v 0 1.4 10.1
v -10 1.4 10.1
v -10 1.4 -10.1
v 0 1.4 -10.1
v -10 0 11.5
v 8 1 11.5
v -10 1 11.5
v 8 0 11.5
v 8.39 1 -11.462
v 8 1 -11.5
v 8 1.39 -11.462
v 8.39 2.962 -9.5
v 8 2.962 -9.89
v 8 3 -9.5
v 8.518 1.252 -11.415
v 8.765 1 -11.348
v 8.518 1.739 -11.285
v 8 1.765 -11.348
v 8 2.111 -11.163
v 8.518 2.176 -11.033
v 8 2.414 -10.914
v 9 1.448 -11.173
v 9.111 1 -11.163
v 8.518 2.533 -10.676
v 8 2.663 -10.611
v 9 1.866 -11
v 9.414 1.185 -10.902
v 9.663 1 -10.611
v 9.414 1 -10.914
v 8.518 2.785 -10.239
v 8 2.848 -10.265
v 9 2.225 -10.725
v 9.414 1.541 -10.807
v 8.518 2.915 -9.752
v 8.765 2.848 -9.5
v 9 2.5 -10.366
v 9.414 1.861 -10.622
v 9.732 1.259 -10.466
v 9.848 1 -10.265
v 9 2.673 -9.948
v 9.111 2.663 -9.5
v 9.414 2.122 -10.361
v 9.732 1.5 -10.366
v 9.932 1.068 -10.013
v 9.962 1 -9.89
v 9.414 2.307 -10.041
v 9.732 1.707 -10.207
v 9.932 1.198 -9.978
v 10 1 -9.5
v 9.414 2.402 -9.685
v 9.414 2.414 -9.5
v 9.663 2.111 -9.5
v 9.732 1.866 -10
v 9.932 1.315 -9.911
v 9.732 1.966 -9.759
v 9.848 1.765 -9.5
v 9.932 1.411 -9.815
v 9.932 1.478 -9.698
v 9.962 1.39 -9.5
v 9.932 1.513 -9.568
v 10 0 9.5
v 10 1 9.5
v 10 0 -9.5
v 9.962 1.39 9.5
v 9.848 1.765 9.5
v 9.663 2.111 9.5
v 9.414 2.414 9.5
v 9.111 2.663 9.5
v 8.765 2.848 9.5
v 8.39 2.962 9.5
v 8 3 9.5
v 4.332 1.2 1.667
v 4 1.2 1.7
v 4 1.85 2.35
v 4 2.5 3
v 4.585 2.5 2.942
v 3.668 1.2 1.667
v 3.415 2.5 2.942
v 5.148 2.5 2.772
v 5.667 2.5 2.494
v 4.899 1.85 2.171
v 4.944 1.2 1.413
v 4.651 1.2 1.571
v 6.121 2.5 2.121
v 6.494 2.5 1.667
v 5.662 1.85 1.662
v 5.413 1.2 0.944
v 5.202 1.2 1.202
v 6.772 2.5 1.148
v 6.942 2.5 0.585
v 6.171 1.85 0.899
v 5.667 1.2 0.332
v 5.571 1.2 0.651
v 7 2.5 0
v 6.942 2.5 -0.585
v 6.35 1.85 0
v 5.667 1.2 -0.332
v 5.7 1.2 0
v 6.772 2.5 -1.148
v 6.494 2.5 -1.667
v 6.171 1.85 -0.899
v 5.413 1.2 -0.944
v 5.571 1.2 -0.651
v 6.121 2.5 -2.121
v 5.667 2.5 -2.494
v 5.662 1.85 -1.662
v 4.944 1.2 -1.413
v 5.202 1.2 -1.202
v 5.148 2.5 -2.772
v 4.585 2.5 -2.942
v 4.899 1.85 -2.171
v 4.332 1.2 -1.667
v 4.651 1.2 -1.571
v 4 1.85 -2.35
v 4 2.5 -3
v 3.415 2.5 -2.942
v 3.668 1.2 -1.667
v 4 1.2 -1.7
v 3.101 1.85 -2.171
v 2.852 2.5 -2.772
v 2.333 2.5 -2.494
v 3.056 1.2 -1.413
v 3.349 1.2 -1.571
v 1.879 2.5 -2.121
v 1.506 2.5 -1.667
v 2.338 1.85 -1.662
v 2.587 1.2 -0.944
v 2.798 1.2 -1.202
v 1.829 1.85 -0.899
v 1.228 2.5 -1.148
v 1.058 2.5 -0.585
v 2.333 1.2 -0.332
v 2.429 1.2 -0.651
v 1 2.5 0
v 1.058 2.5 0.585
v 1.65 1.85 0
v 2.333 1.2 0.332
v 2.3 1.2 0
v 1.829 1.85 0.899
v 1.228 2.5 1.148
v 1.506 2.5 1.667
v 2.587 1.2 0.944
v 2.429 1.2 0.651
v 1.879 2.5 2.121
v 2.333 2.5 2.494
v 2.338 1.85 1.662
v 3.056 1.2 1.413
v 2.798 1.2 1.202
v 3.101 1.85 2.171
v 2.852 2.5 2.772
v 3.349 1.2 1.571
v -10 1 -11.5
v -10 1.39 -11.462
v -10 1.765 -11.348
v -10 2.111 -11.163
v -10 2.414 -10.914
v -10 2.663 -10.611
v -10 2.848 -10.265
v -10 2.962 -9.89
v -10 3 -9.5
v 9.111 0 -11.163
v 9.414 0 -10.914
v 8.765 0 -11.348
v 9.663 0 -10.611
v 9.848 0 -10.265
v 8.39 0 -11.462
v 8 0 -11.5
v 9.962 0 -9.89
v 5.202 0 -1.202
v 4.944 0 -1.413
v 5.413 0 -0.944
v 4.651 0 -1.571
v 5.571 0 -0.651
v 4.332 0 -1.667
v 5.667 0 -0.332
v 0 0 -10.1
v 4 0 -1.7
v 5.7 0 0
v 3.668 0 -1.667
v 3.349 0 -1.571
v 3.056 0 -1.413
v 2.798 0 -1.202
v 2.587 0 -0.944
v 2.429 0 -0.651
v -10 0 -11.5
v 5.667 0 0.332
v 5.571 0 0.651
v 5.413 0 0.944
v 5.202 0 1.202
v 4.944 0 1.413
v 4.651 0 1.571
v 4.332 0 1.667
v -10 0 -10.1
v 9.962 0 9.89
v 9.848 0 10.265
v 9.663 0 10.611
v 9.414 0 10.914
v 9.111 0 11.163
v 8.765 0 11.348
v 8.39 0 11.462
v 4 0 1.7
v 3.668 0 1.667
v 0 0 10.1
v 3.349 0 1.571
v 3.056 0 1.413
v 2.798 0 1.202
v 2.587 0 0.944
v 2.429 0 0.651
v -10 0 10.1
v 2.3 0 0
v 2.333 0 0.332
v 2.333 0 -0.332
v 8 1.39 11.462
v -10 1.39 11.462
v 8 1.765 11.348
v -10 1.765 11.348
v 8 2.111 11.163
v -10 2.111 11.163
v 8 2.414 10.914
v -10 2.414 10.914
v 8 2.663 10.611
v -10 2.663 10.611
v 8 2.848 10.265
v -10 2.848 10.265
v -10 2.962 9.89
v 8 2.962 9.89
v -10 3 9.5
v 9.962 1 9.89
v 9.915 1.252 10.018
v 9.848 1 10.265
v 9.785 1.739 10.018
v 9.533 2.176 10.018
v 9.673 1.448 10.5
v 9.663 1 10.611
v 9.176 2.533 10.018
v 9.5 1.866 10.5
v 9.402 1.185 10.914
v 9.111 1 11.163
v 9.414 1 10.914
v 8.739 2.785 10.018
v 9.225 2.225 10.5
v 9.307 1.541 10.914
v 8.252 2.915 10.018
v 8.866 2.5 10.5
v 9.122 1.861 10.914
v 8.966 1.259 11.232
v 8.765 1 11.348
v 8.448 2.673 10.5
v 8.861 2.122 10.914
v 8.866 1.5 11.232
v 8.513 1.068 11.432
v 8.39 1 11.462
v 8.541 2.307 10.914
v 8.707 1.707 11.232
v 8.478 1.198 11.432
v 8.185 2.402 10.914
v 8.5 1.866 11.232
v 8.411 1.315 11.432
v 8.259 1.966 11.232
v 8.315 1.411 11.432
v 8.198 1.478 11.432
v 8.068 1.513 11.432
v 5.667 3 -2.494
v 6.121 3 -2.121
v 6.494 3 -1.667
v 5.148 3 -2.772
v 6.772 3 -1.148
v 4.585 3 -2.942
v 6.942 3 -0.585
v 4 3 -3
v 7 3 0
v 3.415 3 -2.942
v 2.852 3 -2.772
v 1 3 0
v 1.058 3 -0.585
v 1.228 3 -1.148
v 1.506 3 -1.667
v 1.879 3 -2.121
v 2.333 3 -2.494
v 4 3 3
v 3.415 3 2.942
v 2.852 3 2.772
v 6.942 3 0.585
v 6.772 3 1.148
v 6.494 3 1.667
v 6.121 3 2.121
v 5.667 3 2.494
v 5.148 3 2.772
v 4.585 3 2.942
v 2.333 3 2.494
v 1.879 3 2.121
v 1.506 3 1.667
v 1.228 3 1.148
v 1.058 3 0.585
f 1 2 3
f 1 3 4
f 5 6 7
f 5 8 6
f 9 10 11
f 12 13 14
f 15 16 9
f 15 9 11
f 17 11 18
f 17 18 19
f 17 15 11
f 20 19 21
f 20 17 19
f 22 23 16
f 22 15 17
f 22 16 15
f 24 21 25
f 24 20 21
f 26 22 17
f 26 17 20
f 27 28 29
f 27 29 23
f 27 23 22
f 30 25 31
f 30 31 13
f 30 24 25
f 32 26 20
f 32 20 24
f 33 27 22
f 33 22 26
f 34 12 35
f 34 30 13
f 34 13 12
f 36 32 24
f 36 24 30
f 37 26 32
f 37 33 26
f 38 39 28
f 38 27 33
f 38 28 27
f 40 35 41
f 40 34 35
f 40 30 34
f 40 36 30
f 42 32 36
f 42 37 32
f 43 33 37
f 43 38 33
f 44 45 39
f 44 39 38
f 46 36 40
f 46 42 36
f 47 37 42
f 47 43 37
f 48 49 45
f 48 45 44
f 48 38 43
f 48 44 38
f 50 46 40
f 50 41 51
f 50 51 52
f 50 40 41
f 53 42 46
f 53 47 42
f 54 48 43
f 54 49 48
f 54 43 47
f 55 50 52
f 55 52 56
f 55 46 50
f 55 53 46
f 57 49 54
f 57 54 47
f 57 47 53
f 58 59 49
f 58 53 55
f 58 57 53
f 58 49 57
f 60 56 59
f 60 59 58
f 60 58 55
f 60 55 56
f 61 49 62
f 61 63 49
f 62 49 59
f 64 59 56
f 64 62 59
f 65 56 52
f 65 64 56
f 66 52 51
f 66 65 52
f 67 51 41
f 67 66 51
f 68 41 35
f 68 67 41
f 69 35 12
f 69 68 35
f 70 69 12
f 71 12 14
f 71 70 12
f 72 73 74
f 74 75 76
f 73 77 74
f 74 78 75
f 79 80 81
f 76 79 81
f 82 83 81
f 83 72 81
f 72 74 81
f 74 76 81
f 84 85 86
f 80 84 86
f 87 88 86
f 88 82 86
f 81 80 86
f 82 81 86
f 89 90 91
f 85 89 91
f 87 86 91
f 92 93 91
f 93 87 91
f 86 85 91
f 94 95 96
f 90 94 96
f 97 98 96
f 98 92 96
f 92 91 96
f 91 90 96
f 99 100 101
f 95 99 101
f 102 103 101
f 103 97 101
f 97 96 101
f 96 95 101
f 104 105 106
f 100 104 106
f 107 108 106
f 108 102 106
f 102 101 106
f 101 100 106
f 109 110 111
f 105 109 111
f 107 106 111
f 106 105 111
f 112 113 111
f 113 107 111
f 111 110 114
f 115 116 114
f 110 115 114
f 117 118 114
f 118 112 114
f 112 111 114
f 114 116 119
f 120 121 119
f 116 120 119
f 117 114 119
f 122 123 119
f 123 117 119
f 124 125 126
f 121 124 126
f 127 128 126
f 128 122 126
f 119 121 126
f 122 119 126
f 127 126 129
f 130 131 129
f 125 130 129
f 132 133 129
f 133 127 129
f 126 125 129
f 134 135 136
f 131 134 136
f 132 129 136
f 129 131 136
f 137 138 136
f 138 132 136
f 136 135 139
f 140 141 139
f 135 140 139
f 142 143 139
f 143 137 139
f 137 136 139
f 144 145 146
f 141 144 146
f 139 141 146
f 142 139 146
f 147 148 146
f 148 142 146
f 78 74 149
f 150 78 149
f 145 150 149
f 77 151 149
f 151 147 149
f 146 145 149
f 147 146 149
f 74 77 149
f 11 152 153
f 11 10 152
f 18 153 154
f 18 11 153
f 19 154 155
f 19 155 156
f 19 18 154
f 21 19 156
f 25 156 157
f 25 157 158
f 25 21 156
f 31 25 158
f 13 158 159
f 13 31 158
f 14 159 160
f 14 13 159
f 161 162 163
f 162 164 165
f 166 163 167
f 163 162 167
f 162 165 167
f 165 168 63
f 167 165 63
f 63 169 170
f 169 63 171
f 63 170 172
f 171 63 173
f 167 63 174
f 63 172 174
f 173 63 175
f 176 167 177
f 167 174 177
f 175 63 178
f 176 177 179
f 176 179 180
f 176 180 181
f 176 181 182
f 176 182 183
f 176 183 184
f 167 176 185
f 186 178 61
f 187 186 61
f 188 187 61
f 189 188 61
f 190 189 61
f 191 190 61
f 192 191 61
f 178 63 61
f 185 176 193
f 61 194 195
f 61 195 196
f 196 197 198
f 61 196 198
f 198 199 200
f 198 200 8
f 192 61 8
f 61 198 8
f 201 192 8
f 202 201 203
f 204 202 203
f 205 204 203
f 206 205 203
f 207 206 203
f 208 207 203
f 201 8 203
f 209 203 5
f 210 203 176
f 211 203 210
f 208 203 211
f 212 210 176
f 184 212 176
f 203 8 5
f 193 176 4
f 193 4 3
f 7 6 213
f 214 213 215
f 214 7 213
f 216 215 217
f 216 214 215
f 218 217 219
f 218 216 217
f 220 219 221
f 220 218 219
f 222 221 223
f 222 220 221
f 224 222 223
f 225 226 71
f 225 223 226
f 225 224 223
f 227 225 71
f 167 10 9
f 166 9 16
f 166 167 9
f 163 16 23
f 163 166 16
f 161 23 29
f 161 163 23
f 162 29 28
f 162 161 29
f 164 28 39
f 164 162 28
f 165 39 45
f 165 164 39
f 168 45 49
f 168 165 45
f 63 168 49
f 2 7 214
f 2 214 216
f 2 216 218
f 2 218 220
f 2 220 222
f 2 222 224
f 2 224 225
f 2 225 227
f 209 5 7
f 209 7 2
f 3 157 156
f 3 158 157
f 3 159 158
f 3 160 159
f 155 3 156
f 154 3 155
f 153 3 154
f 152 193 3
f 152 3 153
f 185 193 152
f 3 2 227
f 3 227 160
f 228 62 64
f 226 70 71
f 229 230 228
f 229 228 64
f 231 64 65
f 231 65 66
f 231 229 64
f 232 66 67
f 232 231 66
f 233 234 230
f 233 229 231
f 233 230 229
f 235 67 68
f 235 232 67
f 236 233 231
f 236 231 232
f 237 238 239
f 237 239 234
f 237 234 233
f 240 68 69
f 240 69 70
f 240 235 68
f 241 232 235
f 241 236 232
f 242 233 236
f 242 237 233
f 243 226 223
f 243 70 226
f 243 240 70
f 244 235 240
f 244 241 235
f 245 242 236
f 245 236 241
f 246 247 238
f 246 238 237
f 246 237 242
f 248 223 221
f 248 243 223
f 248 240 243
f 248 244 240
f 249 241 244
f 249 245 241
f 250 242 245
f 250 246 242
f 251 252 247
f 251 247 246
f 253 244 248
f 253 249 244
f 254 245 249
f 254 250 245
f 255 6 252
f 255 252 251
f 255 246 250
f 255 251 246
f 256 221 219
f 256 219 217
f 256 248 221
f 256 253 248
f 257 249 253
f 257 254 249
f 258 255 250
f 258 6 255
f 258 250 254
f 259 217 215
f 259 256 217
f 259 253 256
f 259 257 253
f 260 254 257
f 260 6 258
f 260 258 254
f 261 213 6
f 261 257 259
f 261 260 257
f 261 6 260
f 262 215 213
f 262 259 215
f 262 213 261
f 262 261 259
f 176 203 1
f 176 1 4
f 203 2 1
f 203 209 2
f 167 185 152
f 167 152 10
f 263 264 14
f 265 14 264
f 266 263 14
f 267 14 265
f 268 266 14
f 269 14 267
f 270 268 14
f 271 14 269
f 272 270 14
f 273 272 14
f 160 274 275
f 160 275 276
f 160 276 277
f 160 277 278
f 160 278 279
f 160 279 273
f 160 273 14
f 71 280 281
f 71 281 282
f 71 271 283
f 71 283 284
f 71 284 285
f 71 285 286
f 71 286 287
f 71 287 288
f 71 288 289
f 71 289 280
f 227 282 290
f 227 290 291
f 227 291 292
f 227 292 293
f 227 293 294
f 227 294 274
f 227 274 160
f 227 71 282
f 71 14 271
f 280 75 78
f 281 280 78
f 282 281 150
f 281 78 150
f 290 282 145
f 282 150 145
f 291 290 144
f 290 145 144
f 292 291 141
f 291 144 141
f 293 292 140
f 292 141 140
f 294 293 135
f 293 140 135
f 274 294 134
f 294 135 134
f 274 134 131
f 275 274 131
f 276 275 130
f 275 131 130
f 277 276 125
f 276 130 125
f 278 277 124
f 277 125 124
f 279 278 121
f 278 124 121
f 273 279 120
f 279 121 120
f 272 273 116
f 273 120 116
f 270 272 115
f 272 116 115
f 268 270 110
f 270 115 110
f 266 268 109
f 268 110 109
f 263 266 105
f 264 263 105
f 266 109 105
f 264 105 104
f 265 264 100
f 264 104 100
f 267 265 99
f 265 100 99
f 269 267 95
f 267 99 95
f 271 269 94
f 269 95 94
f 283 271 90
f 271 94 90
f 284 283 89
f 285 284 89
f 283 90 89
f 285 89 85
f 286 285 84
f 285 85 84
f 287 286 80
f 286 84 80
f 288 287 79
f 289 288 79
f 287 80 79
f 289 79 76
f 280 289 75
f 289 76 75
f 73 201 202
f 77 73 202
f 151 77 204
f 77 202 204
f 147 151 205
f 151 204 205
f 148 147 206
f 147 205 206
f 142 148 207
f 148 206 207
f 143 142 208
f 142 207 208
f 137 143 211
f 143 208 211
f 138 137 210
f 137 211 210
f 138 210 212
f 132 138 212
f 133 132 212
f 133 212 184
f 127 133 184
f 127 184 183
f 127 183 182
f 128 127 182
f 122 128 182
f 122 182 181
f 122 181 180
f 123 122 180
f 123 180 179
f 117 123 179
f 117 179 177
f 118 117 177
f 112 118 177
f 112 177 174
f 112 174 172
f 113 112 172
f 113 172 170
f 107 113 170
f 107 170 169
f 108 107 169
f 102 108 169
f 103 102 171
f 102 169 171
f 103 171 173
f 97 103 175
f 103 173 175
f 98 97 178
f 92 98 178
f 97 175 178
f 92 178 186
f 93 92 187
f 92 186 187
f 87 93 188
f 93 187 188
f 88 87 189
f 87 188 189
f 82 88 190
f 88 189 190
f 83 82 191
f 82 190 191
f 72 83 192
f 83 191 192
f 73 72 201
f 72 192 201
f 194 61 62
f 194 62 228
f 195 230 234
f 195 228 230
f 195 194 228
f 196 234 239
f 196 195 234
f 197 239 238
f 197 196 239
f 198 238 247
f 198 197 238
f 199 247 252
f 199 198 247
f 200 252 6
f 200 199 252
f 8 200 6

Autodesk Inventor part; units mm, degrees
ref_plane "YZ Plane" through (0, 0, 0) normal (1, 0, 0) x (0, 1, 0)
ref_plane "XZ Plane" through (0, 0, 0) normal (0, 1, 0) x (-1, 0, 0)
ref_plane "XY Plane" through (0, 0, 0) normal (0, 0, 1) x (1, 0, 0)
sketch "Sketch1" plane through (0, 0, 0) normal (0, 1, 0) x (-1, 0, 0)
  line L0 (-10, 11.5) -> (10, 11.5)
  line L1 (10, 11.5) -> (10, -11.5)
  line L2 (10, -11.5) -> (-10, -11.5)
  line L3 (-10, -11.5) -> (-10, 11.5)
  line L4 (-10, 11.5) -> (10, -11.5) construction
  line L5 (10, 11.5) -> (-10, -11.5) construction
  point P0 (0, 0)
  dimension "d0" = 20
  dimension "d1" = 23
extrude "Extrusion1" add sketch "Sketch1" along normal blind 3
sketch "Sketch2" plane through (0, 0, 0) normal (0, -1, 0) x (1, 0, 0)
  line L0 (10, -11.5) -> (-10, -11.5) projected
  line L1 (10, 11.5) -> (10, -11.5) projected
  line L2 (-10, 11.5) -> (10, 11.5) projected
  line L3 (-10, -11.5) -> (-10, 11.5) projected
  line L4 (0, -10.1) -> (-10, -10.1)
  line L5 (-10, -10.1) -> (-10, 10.1)
  line L6 (-10, 10.1) -> (0, 10.1)
  line L7 (0, 10.1) -> (0, -10.1)
  line L8 (0, -10.1) -> (-10, 10.1) construction
  line L9 (-10, -10.1) -> (0, 10.1) construction
  line L10 (-10, -11.5) -> (-10, 11.5) projected
  point P0 (0, 0)
  point P1 (-5, 0)
  dimension "d4" = 20.2
  dimension "d5" = 10
extrude "Extrusion2" cut sketch "Sketch2" against normal blind 1.4 contours L3 L6 L7 L4
sketch "Sketch3" plane through (0, 3, 0) normal (0, 1, 0) x (1, 0, 0)
  line L0 (10, -11.5) -> (10, 11.5) projected
  point P0 (0, 0)
  point P1 (4, 0)
  dimension "d8" = 6
hole "Hole1" at (4, 3, 0) direction (0, -1, 0) diameter 3.4 end through all counterbore diameter 6 counterbore depth 0.5
chamfer "Chamfer1" distance 1.3 angle 45 1 edges at (4, 2.5, -1.7)
fillet "Fillet1" radius 2 3 edges at (0, 3, 11.5) (10, 3, 0) (0, 3, -11.5)
fillet "Fillet2" radius 2 4 edges at (9.4142, 2.4142, 10.9142) (10, 0.5, 11.5) (9.4142, 2.4142, -10.9142) (10, 0.5, -11.5)
properties part number "LIKA LKM-1439"
